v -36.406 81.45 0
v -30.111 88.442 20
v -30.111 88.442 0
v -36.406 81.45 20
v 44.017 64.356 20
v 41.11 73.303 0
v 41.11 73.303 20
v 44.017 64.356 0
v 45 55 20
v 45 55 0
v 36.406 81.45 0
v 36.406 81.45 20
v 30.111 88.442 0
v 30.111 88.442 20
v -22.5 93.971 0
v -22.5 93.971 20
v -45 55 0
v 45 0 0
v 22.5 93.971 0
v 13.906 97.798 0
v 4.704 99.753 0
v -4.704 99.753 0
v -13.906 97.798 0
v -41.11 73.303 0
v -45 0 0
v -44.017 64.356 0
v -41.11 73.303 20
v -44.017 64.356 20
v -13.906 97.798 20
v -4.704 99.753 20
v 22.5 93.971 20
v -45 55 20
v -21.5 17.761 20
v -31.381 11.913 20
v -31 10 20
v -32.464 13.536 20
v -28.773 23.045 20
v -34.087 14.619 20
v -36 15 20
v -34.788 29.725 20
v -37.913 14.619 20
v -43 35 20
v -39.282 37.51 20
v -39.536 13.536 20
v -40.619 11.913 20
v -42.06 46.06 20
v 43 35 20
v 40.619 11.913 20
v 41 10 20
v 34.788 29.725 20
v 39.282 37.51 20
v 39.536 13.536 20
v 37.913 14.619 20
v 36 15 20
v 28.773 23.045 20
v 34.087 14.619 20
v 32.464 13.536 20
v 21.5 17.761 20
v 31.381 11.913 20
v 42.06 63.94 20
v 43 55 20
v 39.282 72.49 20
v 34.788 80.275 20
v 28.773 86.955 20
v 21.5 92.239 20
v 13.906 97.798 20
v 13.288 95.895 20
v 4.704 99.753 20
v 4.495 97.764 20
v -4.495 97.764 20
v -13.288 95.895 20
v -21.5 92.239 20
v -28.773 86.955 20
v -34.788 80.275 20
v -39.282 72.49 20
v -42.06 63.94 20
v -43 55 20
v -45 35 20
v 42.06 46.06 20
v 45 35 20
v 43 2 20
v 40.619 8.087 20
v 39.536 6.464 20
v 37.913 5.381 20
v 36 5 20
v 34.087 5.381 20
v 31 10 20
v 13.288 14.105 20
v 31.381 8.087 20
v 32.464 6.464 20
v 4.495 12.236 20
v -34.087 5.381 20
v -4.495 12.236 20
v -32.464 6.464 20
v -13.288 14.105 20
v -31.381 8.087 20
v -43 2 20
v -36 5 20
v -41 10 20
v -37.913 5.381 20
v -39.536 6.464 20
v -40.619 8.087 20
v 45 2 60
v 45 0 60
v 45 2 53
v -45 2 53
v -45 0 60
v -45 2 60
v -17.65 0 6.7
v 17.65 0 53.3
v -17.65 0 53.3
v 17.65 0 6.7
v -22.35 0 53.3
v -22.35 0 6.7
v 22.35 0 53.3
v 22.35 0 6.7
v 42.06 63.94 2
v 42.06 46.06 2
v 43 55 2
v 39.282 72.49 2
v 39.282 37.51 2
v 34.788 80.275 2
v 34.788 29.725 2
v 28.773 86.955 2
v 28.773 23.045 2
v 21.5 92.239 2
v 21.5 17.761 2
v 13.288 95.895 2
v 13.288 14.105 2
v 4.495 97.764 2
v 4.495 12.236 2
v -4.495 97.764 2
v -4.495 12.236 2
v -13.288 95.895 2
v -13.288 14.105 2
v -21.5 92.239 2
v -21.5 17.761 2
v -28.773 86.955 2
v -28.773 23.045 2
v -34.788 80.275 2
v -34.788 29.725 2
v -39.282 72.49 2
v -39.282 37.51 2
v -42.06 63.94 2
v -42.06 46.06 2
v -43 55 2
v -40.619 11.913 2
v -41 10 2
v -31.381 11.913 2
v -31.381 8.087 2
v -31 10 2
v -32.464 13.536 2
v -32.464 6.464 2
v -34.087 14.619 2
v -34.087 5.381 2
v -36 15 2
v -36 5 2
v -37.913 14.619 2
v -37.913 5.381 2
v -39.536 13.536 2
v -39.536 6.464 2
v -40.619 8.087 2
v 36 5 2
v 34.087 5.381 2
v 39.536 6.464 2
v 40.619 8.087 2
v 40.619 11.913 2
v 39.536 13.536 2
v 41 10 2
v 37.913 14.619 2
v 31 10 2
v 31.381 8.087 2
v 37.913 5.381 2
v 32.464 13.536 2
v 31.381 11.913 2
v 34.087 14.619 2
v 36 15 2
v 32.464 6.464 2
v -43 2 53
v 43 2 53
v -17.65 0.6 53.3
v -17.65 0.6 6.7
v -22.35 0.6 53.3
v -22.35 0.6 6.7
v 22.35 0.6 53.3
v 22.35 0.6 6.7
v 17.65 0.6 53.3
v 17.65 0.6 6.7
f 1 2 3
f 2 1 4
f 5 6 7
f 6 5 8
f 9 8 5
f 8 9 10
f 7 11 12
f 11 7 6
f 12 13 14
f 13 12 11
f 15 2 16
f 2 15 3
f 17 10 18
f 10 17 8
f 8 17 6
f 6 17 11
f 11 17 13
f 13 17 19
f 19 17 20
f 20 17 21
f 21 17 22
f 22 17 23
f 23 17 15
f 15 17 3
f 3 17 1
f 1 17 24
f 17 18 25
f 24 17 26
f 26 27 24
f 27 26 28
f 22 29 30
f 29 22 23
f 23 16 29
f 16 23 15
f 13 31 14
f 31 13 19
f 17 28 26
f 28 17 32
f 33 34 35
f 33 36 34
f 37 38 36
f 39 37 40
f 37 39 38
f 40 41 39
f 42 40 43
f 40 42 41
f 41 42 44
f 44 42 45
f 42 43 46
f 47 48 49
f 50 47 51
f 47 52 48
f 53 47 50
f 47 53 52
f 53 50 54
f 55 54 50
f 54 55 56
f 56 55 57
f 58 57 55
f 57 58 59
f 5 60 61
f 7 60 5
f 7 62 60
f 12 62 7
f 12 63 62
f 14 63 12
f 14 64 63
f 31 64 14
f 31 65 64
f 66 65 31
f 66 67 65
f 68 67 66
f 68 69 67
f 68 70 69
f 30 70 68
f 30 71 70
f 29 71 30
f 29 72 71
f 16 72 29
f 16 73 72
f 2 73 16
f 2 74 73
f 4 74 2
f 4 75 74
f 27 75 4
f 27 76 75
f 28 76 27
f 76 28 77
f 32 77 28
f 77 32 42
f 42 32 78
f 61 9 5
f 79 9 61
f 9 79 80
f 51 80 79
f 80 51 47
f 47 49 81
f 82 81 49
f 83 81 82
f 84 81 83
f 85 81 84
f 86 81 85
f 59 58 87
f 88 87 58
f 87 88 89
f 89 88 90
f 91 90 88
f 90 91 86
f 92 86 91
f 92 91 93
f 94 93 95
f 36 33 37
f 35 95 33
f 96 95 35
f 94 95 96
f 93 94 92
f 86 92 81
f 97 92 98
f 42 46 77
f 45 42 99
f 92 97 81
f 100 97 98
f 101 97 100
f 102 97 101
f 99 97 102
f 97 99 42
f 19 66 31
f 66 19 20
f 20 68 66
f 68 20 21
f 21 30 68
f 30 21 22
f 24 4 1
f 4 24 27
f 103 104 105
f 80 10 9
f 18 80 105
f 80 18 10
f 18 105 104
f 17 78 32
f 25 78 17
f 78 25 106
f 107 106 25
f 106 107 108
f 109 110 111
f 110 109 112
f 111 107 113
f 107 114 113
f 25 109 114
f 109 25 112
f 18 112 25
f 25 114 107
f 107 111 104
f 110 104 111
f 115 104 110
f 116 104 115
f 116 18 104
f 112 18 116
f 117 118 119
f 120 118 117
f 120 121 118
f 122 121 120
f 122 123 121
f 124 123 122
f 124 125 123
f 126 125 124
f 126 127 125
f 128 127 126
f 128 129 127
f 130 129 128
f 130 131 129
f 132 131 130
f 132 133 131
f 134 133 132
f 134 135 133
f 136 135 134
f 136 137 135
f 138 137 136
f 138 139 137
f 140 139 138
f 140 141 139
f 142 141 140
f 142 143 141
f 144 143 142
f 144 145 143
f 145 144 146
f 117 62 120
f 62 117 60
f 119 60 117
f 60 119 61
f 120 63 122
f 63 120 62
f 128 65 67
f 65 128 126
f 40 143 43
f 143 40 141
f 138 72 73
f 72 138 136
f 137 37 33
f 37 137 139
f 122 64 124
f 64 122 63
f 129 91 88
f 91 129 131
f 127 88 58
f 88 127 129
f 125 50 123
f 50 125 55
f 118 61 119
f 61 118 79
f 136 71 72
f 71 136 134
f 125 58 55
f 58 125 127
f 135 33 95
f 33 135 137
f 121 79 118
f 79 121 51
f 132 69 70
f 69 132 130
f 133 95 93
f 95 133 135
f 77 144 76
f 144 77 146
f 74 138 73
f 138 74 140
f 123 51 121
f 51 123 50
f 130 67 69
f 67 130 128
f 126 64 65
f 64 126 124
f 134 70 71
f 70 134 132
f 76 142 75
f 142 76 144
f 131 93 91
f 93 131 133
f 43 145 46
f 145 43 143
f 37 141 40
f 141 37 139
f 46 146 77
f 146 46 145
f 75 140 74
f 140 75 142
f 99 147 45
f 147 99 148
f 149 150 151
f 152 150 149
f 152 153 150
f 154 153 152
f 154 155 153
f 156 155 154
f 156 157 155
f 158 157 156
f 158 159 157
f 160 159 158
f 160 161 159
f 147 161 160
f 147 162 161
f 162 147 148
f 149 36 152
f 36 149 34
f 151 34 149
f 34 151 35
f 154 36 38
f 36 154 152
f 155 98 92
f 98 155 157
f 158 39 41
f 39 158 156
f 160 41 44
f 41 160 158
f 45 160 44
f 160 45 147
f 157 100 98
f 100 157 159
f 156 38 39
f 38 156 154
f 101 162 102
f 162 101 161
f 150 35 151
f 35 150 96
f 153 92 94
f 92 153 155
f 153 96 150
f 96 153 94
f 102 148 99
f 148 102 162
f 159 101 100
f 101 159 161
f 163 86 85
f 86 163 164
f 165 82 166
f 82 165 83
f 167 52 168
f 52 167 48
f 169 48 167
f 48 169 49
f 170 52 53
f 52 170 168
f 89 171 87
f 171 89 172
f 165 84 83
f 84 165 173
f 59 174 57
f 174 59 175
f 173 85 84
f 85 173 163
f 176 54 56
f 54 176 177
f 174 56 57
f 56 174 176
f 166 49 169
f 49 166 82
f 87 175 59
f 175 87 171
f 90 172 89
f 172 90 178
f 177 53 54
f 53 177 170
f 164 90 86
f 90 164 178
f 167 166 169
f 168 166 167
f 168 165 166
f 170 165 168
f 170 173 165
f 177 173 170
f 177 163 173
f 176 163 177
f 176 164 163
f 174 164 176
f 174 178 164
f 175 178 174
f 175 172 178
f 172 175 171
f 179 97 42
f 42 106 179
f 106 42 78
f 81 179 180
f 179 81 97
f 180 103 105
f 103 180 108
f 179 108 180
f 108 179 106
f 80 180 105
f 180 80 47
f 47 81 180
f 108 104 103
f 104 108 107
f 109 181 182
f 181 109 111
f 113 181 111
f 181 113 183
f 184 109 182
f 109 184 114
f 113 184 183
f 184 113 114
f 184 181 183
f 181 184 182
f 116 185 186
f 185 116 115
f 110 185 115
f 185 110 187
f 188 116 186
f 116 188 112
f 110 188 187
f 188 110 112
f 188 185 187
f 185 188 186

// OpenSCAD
// file: IKEA Skadis v2 hook cutouts.scad
skadis_hook_width = 4.5;
skadis_hook_height = 46;
skadis_hole_spacing_width = 40; // middle to middle
cutout_tolerance_w = 0.2;
cutout_tolerance_h = 0.6;


module skadis_hook_cutout(center=false, hook_count=2) {
    
    if(center) {
        translate([-(skadis_hole_spacing_width + skadis_hook_width) / 2, 0, - skadis_hook_height / 2])
        object(hook_count);
    } else {
        object();
    }
    

}

module object(hook_count=2) {
    union() {

        // Cutout for the hook 1
        color("red")
        translate([- cutout_tolerance_w / 2, 0, - cutout_tolerance_h / 2])
        cube([skadis_hook_width + cutout_tolerance_w, 2, skadis_hook_height + cutout_tolerance_h]);

        // Cutout for the hook 2
        color("red")
        translate([- cutout_tolerance_w / 2 + skadis_hole_spacing_width, 0, - cutout_tolerance_h / 2])
        cube([skadis_hook_width + cutout_tolerance_w, 2, skadis_hook_height + cutout_tolerance_h]);

    }
}

skadis_hook_cutout(center = false);
// file: ../modules/roundedcube.scad
// More information: https://danielupshaw.com/openscad-rounded-corners/


// Examples
// color("Yellow")
// roundedcube(3, true, 0.7, "xmin");

// translate(v = [1, 0, 2])
// color("Pink")
// roundedcube([4, 2, 2], false, 0.6, "zmax");

// translate(v = [-4, -1, 2])
// color("Lightblue")
// roundedcube(2, false);

// translate(v = [0, 0, 6])
// color("Orange")
// roundedcube([3, 2, 2], true, 0.2);

// translate(v = [2.5, -0.5, 5])
// color("Green")
// roundedcube([3, 2, 2], false, 0.4, "z");

// Set to 0.01 for higher definition curves (renders slower)
$fs = 0.15;

module roundedcube(size = [1, 1, 1], center = false, radius = 0.5, apply_to = "all") {
	// If single value, convert to [x, y, z] vector
	size = (size[0] == undef) ? [size, size, size] : size;

	translate_min = radius;
	translate_xmax = size[0] - radius;
	translate_ymax = size[1] - radius;
	translate_zmax = size[2] - radius;

	diameter = radius * 2;

	obj_translate = (center == false) ?
		[0, 0, 0] : [
			-(size[0] / 2),
			-(size[1] / 2),
			-(size[2] / 2)
		];

	translate(v = obj_translate) {
		hull() {
			for (translate_x = [translate_min, translate_xmax]) {
				x_at = (translate_x == translate_min) ? "min" : "max";
				for (translate_y = [translate_min, translate_ymax]) {
					y_at = (translate_y == translate_min) ? "min" : "max";
					for (translate_z = [translate_min, translate_zmax]) {
						z_at = (translate_z == translate_min) ? "min" : "max";

						translate(v = [translate_x, translate_y, translate_z])
						if (
							(apply_to == "all") ||
							(apply_to == "xmin" && x_at == "min") || (apply_to == "xmax" && x_at == "max") ||
							(apply_to == "ymin" && y_at == "min") || (apply_to == "ymax" && y_at == "max") ||
							(apply_to == "zmin" && z_at == "min") || (apply_to == "zmax" && z_at == "max")
						) {
							sphere(r = radius);
						} else {
							rotate = 
								(apply_to == "xmin" || apply_to == "xmax" || apply_to == "x") ? [0, 90, 0] : (
								(apply_to == "ymin" || apply_to == "ymax" || apply_to == "y") ? [90, 90, 0] :
								[0, 0, 0]
							);
							rotate(a = rotate)
							cylinder(h = diameter, r = radius, center = true);
						}
					}
				}
			}
		}
	}
}
// main file
_height = 20;
_radius = 45;
_thickness = 2;
_pen_holes_radius = 5;
_enforcements = 1;

//use <./IKEA Skadis include backwall with 3 hooks.scad>
use <../modules/roundedcube.scad>
use <./IKEA Skadis v2 hook cutouts.scad>


// The cup holder
module cup_holder() {
    difference() {
        difference() {
            union() {
                cylinder(h = _height, r = _radius);
                color("lightgreen")
                translate([0, - _radius / 2 - 5, _height / 2])
                cube([_radius * 2, _radius + 10, _height], center = true);
            }
            translate([0, 0, _thickness])
            cylinder(h = _height, r = _radius - _thickness);

            // left pen hole
            translate([- _radius + _pen_holes_radius + _thickness + 2, - _radius + _pen_holes_radius + _thickness - 7, _thickness])
            cylinder(h = _height, r = _pen_holes_radius);

            // right pen hole
            translate([+ _radius - _pen_holes_radius - _thickness - 2, - _radius + _pen_holes_radius + _thickness - 7, _thickness])
            cylinder(h = _height, r = _pen_holes_radius);
        }
    }
}

// the triangle for the optional enforcements
module triangle(_h) {
    rotate([0, 270, 0])
    linear_extrude(_thickness)
    polygon(points=[[0,0], [_h - _thickness - 5,0], [0,_h - _thickness - 5], [0,0]]);
}

difference() {

    union() {

        // Execute cup_holder
        translate([0, _radius + 10, 0])
        cup_holder();

        // Add the backwall
        translate([- _radius, 0, 0])
        cube([_radius * 2, _thickness, 60]);

        if(_enforcements == 1) {
            if(_height < 40) {
                // Left enforcement
                translate([- _radius + _thickness, _thickness, _height])
                triangle(60 - _height);

                // Right enforcement
                translate([+ _radius, _thickness, _height])
                triangle(60 - _height);
            }
        }

    }
    color("red")
    translate([0, -1.4, 30])
    skadis_hook_cutout(center=true);
}
